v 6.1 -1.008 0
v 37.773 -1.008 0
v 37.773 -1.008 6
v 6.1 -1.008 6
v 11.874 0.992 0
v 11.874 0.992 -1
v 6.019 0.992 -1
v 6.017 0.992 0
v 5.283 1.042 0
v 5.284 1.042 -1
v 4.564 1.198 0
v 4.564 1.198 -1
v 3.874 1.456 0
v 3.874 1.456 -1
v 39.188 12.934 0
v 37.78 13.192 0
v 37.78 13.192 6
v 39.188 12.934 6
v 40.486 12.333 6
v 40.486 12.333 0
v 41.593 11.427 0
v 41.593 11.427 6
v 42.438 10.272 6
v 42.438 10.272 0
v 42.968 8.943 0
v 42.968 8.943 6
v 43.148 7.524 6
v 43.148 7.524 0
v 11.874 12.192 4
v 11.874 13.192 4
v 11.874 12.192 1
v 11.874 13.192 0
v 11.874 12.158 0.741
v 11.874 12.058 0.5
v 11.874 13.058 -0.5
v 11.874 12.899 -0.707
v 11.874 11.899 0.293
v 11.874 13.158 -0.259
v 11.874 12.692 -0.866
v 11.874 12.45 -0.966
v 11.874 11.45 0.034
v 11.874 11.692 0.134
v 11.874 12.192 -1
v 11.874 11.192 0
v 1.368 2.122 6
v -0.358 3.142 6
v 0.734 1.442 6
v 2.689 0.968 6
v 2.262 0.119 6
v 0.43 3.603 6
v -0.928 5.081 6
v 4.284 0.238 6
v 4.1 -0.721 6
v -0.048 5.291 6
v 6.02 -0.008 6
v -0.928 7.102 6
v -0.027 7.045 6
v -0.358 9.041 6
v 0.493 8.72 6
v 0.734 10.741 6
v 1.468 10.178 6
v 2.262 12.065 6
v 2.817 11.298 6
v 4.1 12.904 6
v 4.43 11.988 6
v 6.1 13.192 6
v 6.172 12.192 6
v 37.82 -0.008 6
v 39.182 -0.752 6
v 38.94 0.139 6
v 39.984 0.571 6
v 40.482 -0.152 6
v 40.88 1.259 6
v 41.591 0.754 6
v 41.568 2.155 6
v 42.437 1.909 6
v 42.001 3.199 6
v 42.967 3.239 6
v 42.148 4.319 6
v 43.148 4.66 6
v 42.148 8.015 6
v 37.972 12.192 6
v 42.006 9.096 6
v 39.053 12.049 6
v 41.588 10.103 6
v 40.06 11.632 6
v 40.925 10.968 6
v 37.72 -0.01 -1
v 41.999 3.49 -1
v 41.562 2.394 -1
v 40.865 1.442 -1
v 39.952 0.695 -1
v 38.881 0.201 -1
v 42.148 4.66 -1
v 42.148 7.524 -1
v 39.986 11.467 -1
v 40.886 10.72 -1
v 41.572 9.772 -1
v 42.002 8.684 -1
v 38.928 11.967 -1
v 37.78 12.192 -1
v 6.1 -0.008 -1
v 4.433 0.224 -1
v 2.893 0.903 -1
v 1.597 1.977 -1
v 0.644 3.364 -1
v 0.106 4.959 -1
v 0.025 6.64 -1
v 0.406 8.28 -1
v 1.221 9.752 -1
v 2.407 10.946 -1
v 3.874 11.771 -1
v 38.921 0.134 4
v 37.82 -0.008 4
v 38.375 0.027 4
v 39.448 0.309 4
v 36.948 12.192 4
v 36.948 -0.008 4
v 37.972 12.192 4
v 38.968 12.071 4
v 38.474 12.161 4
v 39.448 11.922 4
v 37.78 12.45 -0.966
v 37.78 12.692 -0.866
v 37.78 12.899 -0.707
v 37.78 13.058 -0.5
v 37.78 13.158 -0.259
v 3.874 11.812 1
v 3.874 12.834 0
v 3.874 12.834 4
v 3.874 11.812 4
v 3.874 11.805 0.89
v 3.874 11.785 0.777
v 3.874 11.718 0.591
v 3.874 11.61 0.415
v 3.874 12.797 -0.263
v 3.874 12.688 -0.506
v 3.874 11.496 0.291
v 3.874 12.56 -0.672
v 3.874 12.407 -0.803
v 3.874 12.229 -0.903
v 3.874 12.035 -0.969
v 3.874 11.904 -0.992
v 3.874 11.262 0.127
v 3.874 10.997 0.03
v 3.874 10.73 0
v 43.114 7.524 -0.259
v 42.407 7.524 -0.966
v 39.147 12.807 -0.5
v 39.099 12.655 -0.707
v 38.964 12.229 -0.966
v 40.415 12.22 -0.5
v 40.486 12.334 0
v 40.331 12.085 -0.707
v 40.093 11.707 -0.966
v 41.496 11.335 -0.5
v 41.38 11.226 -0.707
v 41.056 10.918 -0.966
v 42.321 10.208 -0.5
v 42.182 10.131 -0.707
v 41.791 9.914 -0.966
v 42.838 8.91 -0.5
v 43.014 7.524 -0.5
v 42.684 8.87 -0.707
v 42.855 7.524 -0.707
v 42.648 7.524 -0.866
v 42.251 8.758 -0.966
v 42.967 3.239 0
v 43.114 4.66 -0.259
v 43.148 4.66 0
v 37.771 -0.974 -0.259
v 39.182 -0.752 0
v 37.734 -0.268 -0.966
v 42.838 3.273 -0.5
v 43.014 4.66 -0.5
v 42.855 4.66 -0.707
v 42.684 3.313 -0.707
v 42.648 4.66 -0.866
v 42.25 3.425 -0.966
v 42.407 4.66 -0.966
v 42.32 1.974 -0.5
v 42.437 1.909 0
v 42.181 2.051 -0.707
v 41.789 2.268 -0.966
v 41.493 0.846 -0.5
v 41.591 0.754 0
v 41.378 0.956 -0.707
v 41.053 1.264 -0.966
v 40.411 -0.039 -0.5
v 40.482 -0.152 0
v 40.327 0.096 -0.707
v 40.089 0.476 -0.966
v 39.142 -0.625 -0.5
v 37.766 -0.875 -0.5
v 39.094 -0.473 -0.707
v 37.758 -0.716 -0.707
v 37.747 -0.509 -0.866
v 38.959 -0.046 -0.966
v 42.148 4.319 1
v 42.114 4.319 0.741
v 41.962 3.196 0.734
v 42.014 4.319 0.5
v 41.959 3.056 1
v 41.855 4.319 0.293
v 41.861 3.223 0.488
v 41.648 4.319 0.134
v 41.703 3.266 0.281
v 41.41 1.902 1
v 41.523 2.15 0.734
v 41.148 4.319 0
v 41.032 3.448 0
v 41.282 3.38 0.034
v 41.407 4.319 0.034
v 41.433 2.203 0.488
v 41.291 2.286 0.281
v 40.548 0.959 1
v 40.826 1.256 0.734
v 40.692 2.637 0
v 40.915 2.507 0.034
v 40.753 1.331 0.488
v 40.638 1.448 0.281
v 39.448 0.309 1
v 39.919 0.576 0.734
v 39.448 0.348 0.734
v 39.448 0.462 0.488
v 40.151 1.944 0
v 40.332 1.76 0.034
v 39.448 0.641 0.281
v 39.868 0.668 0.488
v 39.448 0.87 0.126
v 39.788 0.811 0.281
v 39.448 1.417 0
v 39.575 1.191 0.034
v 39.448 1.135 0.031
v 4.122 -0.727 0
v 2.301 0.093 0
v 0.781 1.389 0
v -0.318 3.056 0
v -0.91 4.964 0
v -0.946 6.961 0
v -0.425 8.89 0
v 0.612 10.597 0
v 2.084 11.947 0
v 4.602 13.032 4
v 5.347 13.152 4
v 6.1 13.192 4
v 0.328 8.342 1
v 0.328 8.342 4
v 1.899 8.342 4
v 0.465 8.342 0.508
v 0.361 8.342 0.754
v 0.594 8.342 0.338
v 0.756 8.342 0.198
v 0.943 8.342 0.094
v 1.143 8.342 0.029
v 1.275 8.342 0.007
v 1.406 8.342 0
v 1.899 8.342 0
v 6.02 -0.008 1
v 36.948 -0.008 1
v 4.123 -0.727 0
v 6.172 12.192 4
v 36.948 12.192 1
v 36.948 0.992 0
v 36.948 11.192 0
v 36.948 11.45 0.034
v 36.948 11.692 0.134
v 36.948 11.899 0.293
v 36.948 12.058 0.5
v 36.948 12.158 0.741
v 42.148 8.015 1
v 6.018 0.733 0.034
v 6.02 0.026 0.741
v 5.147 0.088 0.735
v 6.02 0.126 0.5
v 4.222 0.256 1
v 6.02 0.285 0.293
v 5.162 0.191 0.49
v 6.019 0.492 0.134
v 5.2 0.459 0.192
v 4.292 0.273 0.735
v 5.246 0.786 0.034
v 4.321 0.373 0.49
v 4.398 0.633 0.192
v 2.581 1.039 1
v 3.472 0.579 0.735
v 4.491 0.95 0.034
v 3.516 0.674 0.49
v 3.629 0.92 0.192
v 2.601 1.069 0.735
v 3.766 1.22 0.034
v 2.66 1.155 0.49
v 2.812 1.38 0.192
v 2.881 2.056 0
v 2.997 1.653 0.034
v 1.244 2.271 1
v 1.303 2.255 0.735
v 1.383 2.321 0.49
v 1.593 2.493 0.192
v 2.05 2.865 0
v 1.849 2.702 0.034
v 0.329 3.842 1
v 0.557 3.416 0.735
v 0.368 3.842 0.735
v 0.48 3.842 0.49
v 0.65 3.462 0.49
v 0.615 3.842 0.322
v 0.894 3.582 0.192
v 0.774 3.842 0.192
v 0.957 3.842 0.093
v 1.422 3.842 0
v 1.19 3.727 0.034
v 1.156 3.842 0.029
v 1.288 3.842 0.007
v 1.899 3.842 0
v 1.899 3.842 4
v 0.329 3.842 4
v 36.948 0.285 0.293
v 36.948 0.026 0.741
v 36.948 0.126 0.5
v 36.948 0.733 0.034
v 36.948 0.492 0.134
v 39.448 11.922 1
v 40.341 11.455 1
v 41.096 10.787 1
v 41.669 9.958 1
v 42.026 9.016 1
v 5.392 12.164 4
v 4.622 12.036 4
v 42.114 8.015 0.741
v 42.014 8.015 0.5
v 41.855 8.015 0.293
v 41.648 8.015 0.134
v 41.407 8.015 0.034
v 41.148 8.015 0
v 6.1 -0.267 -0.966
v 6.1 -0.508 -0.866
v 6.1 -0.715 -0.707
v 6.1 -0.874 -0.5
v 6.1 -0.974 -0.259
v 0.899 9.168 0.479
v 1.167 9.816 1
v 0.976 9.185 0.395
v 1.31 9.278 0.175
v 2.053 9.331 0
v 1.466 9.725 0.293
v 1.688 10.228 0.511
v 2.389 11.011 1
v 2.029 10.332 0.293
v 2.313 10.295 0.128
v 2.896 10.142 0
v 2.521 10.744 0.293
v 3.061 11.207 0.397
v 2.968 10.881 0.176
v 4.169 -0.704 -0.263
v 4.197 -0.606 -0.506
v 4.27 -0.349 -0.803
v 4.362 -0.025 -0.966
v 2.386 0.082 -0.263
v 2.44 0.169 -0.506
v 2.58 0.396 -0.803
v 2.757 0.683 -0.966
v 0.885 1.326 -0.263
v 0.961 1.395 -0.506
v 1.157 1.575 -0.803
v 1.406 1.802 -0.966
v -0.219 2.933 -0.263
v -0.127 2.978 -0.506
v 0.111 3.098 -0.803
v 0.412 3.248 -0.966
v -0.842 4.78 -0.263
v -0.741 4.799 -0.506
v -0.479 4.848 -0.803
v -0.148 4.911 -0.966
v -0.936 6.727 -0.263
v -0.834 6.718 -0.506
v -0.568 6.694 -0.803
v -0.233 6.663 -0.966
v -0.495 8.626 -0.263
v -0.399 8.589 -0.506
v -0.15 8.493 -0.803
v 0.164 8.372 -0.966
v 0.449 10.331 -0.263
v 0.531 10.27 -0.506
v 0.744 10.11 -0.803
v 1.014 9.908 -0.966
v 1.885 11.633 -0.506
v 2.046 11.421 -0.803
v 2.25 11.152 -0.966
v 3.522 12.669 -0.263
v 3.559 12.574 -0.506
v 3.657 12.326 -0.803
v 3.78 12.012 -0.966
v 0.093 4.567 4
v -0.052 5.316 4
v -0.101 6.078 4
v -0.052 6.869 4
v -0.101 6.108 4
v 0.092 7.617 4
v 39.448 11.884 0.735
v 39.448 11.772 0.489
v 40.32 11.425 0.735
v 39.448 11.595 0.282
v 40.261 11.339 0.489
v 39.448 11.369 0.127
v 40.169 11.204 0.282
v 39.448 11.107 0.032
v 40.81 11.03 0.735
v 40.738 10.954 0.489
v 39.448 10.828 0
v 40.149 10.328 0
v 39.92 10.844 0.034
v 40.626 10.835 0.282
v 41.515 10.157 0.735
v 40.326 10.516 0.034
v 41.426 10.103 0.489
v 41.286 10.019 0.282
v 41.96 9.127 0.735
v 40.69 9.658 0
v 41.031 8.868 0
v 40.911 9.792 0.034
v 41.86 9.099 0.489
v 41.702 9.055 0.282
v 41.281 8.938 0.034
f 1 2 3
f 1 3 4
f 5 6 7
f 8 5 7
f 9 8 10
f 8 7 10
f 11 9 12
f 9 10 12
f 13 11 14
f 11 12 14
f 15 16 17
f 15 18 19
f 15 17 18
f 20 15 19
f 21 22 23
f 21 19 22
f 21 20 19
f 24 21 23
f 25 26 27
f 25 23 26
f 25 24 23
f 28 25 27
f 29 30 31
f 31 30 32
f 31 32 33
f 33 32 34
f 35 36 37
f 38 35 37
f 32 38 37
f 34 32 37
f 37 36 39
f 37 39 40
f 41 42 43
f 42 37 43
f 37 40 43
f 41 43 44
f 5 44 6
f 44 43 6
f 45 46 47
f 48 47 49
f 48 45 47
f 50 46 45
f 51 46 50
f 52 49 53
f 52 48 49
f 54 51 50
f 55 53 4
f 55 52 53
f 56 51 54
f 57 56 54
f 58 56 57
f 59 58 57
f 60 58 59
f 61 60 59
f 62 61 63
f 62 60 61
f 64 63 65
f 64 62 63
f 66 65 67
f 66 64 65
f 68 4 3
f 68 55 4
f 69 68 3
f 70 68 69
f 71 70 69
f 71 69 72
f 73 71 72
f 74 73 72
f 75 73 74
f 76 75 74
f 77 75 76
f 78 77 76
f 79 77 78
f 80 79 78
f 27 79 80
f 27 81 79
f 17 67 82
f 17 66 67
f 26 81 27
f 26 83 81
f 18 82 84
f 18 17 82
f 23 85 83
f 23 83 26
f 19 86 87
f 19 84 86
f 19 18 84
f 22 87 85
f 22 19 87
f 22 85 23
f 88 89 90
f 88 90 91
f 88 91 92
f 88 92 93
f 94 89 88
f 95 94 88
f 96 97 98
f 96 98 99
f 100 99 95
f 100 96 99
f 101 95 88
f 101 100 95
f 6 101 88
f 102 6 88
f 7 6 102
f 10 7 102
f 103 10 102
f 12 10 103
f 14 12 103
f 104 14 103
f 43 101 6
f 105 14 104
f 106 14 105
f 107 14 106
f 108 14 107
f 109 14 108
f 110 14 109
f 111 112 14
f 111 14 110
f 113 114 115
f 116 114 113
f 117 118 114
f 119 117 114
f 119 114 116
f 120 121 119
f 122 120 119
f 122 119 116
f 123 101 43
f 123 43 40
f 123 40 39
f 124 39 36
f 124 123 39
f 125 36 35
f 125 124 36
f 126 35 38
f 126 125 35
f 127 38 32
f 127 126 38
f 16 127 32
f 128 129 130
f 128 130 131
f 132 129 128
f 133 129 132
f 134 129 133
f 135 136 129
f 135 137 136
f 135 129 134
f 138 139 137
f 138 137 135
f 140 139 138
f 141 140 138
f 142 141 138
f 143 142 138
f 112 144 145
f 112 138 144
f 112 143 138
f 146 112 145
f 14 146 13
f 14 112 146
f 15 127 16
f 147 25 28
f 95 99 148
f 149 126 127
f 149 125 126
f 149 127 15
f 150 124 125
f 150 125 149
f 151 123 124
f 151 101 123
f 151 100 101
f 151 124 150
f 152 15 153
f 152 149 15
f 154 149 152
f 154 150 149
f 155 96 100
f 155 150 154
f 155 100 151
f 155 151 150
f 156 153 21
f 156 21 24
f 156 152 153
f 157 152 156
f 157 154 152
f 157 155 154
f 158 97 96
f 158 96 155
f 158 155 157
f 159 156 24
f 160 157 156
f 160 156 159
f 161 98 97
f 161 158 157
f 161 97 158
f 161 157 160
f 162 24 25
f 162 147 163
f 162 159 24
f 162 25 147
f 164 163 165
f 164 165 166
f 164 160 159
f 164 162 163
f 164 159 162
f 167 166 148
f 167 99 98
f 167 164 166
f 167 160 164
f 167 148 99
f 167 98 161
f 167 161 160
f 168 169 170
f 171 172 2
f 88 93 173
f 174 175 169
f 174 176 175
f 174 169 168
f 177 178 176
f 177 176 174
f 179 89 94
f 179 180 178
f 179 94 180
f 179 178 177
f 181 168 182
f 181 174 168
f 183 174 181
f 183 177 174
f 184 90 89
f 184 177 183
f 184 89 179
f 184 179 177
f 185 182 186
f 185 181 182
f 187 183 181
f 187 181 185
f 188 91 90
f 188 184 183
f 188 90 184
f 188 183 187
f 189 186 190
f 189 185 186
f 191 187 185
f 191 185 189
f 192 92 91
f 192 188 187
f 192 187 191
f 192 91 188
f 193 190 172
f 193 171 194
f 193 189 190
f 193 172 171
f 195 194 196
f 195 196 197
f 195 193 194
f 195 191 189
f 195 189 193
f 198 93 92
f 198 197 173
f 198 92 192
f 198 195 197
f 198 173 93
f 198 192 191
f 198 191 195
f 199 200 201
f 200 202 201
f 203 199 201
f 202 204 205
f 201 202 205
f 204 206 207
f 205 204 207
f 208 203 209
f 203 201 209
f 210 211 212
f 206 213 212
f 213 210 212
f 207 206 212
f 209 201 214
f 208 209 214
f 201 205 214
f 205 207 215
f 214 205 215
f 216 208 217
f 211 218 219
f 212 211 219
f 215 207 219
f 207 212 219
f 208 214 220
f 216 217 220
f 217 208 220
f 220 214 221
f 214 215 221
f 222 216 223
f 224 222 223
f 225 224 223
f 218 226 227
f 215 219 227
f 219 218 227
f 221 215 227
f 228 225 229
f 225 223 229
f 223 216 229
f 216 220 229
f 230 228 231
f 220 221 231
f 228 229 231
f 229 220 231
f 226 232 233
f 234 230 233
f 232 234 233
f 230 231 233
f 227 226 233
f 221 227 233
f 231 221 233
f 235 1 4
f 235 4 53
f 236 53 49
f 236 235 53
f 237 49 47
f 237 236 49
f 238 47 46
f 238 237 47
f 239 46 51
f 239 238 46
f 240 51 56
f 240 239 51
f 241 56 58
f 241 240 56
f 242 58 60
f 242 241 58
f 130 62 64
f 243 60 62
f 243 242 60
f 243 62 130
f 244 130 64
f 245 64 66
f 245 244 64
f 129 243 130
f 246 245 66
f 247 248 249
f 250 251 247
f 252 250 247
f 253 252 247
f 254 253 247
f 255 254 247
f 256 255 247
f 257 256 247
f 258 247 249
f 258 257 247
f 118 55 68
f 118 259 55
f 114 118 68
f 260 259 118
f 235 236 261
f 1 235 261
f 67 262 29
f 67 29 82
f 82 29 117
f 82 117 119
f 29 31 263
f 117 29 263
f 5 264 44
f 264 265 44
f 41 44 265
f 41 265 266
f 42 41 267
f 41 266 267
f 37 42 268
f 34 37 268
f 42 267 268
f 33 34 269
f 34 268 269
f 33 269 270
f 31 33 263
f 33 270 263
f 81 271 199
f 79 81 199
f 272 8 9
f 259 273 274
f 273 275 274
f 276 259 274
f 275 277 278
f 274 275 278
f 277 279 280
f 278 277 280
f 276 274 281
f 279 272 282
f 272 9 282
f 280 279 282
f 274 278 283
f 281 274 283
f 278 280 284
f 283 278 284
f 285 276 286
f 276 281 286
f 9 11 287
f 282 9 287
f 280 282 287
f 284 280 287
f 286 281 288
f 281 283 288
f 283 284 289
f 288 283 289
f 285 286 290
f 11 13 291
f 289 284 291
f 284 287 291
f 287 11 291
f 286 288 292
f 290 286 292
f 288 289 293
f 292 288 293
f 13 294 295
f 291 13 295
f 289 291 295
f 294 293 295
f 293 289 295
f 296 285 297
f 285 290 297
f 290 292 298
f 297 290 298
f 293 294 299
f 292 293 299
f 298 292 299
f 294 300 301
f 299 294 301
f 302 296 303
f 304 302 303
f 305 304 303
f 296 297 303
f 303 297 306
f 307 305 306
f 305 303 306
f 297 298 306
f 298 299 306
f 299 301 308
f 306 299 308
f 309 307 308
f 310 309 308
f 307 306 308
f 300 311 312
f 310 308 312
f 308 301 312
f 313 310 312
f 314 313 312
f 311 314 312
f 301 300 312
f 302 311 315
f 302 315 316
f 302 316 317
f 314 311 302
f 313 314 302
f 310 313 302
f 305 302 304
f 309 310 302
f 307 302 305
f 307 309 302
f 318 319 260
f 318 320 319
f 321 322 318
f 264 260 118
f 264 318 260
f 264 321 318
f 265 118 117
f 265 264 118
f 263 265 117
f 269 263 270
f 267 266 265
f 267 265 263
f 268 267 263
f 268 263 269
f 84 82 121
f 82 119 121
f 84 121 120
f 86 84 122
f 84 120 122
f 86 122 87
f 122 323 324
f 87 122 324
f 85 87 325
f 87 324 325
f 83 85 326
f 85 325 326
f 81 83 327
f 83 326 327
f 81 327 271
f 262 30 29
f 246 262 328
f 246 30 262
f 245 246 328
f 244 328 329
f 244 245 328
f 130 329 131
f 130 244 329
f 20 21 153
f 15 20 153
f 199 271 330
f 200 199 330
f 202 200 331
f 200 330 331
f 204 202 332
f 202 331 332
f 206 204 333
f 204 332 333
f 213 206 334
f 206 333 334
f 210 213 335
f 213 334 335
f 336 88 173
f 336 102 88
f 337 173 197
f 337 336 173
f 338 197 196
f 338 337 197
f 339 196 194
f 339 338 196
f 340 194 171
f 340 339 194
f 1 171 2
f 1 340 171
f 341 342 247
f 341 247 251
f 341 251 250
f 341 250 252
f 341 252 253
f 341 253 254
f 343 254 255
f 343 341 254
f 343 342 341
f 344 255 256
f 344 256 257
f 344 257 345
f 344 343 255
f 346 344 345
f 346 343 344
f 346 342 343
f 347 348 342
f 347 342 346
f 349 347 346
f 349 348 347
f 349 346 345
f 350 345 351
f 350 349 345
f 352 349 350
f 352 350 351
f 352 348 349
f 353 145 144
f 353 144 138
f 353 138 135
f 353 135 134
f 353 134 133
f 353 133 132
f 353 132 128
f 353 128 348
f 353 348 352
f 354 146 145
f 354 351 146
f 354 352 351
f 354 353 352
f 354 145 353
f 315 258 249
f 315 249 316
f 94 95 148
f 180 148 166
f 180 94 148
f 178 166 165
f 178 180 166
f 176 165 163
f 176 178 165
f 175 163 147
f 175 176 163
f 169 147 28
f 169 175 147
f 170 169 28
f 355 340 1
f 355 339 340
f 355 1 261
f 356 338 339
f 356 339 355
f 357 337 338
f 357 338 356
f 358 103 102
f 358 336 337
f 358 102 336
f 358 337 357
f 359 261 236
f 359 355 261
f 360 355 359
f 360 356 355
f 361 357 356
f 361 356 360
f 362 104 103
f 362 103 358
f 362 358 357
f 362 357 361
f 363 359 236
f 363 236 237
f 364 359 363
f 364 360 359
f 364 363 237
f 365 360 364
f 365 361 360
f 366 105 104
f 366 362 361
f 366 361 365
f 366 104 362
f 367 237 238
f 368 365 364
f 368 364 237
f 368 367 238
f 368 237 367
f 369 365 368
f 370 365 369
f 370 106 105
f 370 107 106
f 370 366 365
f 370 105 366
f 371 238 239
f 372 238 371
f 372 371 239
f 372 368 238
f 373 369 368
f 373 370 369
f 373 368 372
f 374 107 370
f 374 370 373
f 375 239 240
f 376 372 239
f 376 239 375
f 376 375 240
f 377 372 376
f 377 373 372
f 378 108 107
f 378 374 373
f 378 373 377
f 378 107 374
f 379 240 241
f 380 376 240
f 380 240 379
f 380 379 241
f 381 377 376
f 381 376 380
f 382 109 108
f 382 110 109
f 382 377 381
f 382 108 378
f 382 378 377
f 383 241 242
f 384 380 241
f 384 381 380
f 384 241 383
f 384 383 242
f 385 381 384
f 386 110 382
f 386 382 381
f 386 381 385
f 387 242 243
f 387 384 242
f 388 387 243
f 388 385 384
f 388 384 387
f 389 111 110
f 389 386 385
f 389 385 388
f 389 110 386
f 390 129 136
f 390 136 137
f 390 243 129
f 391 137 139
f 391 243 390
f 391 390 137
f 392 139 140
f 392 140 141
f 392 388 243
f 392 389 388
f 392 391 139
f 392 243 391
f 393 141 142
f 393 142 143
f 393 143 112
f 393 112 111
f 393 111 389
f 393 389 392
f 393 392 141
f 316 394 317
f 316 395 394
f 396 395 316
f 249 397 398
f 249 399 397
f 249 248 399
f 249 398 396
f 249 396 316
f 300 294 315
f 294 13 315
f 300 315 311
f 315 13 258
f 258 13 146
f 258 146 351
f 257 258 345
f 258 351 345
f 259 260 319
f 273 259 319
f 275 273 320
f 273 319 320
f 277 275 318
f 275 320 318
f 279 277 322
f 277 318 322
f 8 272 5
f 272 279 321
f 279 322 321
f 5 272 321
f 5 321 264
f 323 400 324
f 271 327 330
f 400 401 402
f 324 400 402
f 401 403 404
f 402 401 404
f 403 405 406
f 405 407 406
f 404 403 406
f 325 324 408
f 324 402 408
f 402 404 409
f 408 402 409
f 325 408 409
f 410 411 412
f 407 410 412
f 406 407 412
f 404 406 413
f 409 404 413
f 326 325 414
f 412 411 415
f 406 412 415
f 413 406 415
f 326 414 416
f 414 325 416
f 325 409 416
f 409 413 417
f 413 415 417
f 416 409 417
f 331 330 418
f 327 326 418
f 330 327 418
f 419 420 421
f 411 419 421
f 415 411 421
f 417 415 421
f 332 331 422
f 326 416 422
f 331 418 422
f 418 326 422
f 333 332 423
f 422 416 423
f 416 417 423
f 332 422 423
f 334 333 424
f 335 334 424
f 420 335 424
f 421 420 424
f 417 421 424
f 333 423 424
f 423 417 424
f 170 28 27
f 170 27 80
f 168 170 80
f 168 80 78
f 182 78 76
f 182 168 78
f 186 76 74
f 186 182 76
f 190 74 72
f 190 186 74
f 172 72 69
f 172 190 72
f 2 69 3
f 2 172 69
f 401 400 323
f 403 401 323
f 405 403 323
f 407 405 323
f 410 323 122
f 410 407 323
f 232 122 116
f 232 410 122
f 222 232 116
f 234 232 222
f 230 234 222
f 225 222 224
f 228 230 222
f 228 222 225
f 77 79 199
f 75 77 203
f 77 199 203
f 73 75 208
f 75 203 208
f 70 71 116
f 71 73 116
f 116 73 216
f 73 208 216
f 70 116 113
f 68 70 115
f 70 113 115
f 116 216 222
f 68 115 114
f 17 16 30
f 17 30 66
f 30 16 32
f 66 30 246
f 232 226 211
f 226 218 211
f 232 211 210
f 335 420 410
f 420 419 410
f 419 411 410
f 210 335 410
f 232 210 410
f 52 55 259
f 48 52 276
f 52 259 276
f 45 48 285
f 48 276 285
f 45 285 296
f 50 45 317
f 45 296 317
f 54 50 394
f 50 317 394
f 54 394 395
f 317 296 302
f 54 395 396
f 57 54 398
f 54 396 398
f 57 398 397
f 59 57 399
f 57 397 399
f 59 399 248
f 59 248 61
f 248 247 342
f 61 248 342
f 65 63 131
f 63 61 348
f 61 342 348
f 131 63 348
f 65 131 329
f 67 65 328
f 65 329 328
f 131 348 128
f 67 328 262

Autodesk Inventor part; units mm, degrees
ref_plane "YZ Plane" through (0, 0, 0) normal (1, 0, 0) x (0, 1, 0)
ref_plane "XZ Plane" through (0, 0, 0) normal (0, 1, 0) x (-1, 0, 0)
ref_plane "XY Plane" through (0, 0, 0) normal (0, 0, 1) x (1, 0, 0)
sketch "Эскиз1" plane through (0, 0, 0) normal (0, 0, 1) x (1, 0, 0)
  arc A0 (6.1718, 12.1916) -> (6.0205, -0.0083) centre (6, 6.0928) ccw
  line L0 (6.1718, 12.1916) -> (6.0205, -0.0083) construction
  line L1 (6.1718, 12.1916) -> (18.3727, 12.1916) construction
  arc A1 (42.148, 8.0153) -> (37.9718, 12.1916) centre (37.9718, 8.0153) ccw
  arc A2 (37.8204, -0.0083) -> (42.148, 4.3193) centre (37.8204, 4.3193) ccw
  arc A3 (6.1001, 13.1916) -> (6.1001, -1.0083) centre (6.1001, 6.0916) ccw
  arc A4 (43.148, 7.5237) -> (37.78, 13.1916) centre (37.4718, 7.5237) ccw
  arc A5 (37.7733, -1.0083) -> (43.148, 4.6599) centre (37.4718, 4.6599) ccw
  line L2 (6.1718, 12.1916) -> (37.9718, 12.1916)
  line L3 (37.78, 13.1916) -> (6.1001, 13.1916)
  line L4 (6.0205, -0.0083) -> (37.8204, -0.0083)
  line L5 (37.7733, -1.0083) -> (6.1001, -1.0083)
  line L6 (42.148, 8.0153) -> (42.148, 4.3193)
  line L7 (43.148, 7.5237) -> (43.148, 4.6599)
  point P0 (0, 0)
  point P1 (0, 0)
  dimension "d7" = 1.5
  dimension "d0" = 90.71
  dimension "d1" = 4.1763
  dimension "d2" = 5.6763
  dimension "d3" = 5.6763
  dimension "d4" = 1
  dimension "d5" = 1
  dimension "d8" = 12.1999
  dimension "d9" = 31.8
  dimension "d10" = 31.7998
  dimension "d13" = 1
extrude "main_walls" add sketch "Эскиз1" along normal blind 6
sketch "Эскиз2" plane through (0, 0, 0) normal (0, 0, -1) x (-1, 0, 0)
  line L0 (-37.7733, -1.0083) -> (-6.1001, -1.0083) projected
  arc A0 (-6.1001, -1.0083) -> (-6.1001, 13.1916) centre (-6.1001, 6.0916) ccw projected
  line L1 (-6.1001, 13.1916) -> (-37.78, 13.1916) projected
  arc A1 (-37.78, 13.1916) -> (-43.148, 7.5237) centre (-37.4718, 7.5237) ccw projected
  line L2 (-43.148, 7.5237) -> (-43.148, 4.6599) projected
  arc A2 (-43.148, 4.6599) -> (-37.7733, -1.0083) centre (-37.4718, 4.6599) ccw projected
  point P0 (0, 0)
extrude "floor" add sketch "Эскиз2" along normal blind 1
sketch "Эскиз3" plane through (0, 0, 0) normal (0, 0, 1) x (1, 0, 0)
  line L0 (42.148, 4.3193) -> (42.148, 8.0153) projected
  arc A0 (42.148, 8.0153) -> (37.9718, 12.1916) centre (37.9718, 8.0153) ccw projected
  line L1 (37.9718, 12.1916) -> (6.1718, 12.1916) projected
  arc A1 (6.1718, 12.1916) -> (6.0205, -0.0083) centre (6, 6.0928) ccw projected
  line L2 (6.0205, -0.0083) -> (37.8204, -0.0083) projected
  arc A2 (37.8204, -0.0083) -> (42.148, 4.3193) centre (37.8204, 4.3193) ccw projected
  line L3 (-0.1012, 8.3416) -> (1.8988, 8.3416)
  line L4 (1.8988, 8.3416) -> (1.8988, 3.8416)
  line L5 (1.8988, 3.8416) -> (-0.1012, 3.8416)
  line L6 (-0.1012, 3.8416) -> (-0.1012, 8.3416)
  arc A3 (6.1718, 12.1916) -> (6.0205, -0.0083) centre (6, 6.0928) ccw projected
  arc A4 (42.148, 8.0153) -> (37.9718, 12.1916) centre (37.9718, 8.0153) ccw projected
  line L7 (6.1718, 12.1916) -> (37.9718, 12.1916) projected
  arc A5 (37.8204, -0.0083) -> (42.148, 4.3193) centre (37.8204, 4.3193) ccw projected
  line L8 (6.0205, -0.0083) -> (37.8204, -0.0083) projected
  line L9 (36.948, 12.1916) -> (39.448, 12.1916)
  line L10 (39.448, 12.1916) -> (39.448, -0.0083)
  line L11 (39.448, -0.0083) -> (36.948, -0.0083)
  line L12 (36.948, -0.0083) -> (36.948, 12.1916)
  point P0 (0, 0)
  dimension "d16" = 2
  dimension "d17" = 4.5
  dimension "d18" = 12.1999
  dimension "d19" = 3.85
  dimension "d22" = 2.7
  dimension "d23" = 2.5
extrude "supports" add sketch "Эскиз3" along normal blind 4 contours L10 L11 A2 | A2 L2 L12 L1 A0 L10 | A0 L9 L10 | L5 L6 A1 | A1 L3 L4 L5 | A1 L6 L3
fillet "bottom_rounding" radius 1 13 edges at (21.5599, 12.1916, 0) (21.4843, -0.0083, 0) (2.5814, 1.0393, 0) (2.6433, 11.1876, 0) (42.148, 6.1673, 0) (41.4101, 1.9022, 0) (41.4073, 10.3898, 0) (-0.9999, 6.0916, -1) (21.94, 13.1916, -1) (21.9367, -1.0083, -1) (43.148, 6.0918, -1) (41.593, 11.4269, -1) (41.5907, 0.7543, -1)
sketch "Эскиз5" plane through (0, 0, 0) normal (0, 0, 1) x (1, 0, 0)
  arc A0 (1.4224, 3.8416) -> (6.0188, 0.9917) centre (6, 6.0928) ccw projected
  line L0 (36.948, 0.9917) -> (6.0188, 0.9917) projected
  line L1 (36.948, 0.9917) -> (36.948, 11.1916) projected
  line L2 (6.1571, 11.1916) -> (36.948, 11.1916) projected
  arc A1 (6.1571, 11.1916) -> (1.4212, 8.3416) centre (6, 6.0928) ccw projected
  line L3 (1.4212, 8.3416) -> (1.8988, 8.3416) projected
  line L4 (1.8988, 8.3416) -> (1.8988, 3.8416) projected
  line L5 (1.8988, 3.8416) -> (1.4224, 3.8416) projected
  line L6 (9.8988, 0.9917) -> (9.8988, 11.1916)
  point P0 (0, 0)
  dimension "d27" = 8
sketch "Эскиз6" plane through (0, 0, -1) normal (0, 0, -1) x (-1, 0, 0)
  line L0 (-1.8988, 8.3416) -> (-1.8988, 3.8416) projected
  line L1 (-1.4212, 8.3416) -> (-1.8988, 8.3416) projected
  arc A0 (-1.4212, 8.3416) -> (-6.1571, 11.1916) centre (-6, 6.0928) ccw projected
  line L2 (-1.8988, 3.8416) -> (-1.4224, 3.8416) projected
  arc A1 (-6.0188, 0.9917) -> (-1.4224, 3.8416) centre (-6, 6.0928) ccw projected
  line L3 (-6.1001, -0.0083) -> (-37.7455, -0.0083) projected
  arc A2 (-6.1001, -0.0083) -> (-6.1001, 12.1916) centre (-6.1001, 6.0916) ccw projected
  line L4 (-37.7515, 12.1916) -> (-6.1001, 12.1916) projected
  arc A3 (-37.7515, 12.1916) -> (-42.148, 7.5237) centre (-37.4718, 7.5237) ccw projected
  line L5 (-42.148, 4.6599) -> (-42.148, 7.5237) projected
  arc A4 (-42.148, 4.6599) -> (-37.7455, -0.0083) centre (-37.4718, 4.6599) ccw projected
  line L6 (-6.1571, 11.1916) -> (-36.948, 11.1916) projected
  line L7 (-36.948, 0.9917) -> (-6.0188, 0.9917) projected
  line L8 (-11.8741, 11.1916) -> (-11.8741, 0.9917)
  line L9 (-3.8741, 10.7299) -> (-3.8741, 1.4557)
  line L10 (-6.1001, 13.1916) -> (-37.78, 13.1916) projected
  line L11 (-3.8741, 10.7299) -> (-11.8741, 10.7299)
  line L12 (-11.8741, 10.7299) -> (-11.8741, 13.1916)
  line L13 (-11.8741, 13.1916) -> (-3.8741, 13.1916)
  line L14 (-3.8741, 13.1916) -> (-3.8741, 10.7299)
  point P0 (0, 0)
  dimension "d31" = 8
extrude "Выдавливание5" cut sketch "Эскиз6" against normal blind 5 contours L11 L8 L6 A0 | L9 A1 L7 L8 L11 | A0 L6 L12 L4 A2 L14 | A2 L4 L12 L10 L13 L14
equation "\"d2\" = d1 + d7"
equation "\"d3\" = d1 + d7"
equation "\"d5\" = d4"
equation "\"d13\" = d4"
equation "\"d19\" = -0.5 * d17 + 0.5 * d18"
properties part number "bottom"
